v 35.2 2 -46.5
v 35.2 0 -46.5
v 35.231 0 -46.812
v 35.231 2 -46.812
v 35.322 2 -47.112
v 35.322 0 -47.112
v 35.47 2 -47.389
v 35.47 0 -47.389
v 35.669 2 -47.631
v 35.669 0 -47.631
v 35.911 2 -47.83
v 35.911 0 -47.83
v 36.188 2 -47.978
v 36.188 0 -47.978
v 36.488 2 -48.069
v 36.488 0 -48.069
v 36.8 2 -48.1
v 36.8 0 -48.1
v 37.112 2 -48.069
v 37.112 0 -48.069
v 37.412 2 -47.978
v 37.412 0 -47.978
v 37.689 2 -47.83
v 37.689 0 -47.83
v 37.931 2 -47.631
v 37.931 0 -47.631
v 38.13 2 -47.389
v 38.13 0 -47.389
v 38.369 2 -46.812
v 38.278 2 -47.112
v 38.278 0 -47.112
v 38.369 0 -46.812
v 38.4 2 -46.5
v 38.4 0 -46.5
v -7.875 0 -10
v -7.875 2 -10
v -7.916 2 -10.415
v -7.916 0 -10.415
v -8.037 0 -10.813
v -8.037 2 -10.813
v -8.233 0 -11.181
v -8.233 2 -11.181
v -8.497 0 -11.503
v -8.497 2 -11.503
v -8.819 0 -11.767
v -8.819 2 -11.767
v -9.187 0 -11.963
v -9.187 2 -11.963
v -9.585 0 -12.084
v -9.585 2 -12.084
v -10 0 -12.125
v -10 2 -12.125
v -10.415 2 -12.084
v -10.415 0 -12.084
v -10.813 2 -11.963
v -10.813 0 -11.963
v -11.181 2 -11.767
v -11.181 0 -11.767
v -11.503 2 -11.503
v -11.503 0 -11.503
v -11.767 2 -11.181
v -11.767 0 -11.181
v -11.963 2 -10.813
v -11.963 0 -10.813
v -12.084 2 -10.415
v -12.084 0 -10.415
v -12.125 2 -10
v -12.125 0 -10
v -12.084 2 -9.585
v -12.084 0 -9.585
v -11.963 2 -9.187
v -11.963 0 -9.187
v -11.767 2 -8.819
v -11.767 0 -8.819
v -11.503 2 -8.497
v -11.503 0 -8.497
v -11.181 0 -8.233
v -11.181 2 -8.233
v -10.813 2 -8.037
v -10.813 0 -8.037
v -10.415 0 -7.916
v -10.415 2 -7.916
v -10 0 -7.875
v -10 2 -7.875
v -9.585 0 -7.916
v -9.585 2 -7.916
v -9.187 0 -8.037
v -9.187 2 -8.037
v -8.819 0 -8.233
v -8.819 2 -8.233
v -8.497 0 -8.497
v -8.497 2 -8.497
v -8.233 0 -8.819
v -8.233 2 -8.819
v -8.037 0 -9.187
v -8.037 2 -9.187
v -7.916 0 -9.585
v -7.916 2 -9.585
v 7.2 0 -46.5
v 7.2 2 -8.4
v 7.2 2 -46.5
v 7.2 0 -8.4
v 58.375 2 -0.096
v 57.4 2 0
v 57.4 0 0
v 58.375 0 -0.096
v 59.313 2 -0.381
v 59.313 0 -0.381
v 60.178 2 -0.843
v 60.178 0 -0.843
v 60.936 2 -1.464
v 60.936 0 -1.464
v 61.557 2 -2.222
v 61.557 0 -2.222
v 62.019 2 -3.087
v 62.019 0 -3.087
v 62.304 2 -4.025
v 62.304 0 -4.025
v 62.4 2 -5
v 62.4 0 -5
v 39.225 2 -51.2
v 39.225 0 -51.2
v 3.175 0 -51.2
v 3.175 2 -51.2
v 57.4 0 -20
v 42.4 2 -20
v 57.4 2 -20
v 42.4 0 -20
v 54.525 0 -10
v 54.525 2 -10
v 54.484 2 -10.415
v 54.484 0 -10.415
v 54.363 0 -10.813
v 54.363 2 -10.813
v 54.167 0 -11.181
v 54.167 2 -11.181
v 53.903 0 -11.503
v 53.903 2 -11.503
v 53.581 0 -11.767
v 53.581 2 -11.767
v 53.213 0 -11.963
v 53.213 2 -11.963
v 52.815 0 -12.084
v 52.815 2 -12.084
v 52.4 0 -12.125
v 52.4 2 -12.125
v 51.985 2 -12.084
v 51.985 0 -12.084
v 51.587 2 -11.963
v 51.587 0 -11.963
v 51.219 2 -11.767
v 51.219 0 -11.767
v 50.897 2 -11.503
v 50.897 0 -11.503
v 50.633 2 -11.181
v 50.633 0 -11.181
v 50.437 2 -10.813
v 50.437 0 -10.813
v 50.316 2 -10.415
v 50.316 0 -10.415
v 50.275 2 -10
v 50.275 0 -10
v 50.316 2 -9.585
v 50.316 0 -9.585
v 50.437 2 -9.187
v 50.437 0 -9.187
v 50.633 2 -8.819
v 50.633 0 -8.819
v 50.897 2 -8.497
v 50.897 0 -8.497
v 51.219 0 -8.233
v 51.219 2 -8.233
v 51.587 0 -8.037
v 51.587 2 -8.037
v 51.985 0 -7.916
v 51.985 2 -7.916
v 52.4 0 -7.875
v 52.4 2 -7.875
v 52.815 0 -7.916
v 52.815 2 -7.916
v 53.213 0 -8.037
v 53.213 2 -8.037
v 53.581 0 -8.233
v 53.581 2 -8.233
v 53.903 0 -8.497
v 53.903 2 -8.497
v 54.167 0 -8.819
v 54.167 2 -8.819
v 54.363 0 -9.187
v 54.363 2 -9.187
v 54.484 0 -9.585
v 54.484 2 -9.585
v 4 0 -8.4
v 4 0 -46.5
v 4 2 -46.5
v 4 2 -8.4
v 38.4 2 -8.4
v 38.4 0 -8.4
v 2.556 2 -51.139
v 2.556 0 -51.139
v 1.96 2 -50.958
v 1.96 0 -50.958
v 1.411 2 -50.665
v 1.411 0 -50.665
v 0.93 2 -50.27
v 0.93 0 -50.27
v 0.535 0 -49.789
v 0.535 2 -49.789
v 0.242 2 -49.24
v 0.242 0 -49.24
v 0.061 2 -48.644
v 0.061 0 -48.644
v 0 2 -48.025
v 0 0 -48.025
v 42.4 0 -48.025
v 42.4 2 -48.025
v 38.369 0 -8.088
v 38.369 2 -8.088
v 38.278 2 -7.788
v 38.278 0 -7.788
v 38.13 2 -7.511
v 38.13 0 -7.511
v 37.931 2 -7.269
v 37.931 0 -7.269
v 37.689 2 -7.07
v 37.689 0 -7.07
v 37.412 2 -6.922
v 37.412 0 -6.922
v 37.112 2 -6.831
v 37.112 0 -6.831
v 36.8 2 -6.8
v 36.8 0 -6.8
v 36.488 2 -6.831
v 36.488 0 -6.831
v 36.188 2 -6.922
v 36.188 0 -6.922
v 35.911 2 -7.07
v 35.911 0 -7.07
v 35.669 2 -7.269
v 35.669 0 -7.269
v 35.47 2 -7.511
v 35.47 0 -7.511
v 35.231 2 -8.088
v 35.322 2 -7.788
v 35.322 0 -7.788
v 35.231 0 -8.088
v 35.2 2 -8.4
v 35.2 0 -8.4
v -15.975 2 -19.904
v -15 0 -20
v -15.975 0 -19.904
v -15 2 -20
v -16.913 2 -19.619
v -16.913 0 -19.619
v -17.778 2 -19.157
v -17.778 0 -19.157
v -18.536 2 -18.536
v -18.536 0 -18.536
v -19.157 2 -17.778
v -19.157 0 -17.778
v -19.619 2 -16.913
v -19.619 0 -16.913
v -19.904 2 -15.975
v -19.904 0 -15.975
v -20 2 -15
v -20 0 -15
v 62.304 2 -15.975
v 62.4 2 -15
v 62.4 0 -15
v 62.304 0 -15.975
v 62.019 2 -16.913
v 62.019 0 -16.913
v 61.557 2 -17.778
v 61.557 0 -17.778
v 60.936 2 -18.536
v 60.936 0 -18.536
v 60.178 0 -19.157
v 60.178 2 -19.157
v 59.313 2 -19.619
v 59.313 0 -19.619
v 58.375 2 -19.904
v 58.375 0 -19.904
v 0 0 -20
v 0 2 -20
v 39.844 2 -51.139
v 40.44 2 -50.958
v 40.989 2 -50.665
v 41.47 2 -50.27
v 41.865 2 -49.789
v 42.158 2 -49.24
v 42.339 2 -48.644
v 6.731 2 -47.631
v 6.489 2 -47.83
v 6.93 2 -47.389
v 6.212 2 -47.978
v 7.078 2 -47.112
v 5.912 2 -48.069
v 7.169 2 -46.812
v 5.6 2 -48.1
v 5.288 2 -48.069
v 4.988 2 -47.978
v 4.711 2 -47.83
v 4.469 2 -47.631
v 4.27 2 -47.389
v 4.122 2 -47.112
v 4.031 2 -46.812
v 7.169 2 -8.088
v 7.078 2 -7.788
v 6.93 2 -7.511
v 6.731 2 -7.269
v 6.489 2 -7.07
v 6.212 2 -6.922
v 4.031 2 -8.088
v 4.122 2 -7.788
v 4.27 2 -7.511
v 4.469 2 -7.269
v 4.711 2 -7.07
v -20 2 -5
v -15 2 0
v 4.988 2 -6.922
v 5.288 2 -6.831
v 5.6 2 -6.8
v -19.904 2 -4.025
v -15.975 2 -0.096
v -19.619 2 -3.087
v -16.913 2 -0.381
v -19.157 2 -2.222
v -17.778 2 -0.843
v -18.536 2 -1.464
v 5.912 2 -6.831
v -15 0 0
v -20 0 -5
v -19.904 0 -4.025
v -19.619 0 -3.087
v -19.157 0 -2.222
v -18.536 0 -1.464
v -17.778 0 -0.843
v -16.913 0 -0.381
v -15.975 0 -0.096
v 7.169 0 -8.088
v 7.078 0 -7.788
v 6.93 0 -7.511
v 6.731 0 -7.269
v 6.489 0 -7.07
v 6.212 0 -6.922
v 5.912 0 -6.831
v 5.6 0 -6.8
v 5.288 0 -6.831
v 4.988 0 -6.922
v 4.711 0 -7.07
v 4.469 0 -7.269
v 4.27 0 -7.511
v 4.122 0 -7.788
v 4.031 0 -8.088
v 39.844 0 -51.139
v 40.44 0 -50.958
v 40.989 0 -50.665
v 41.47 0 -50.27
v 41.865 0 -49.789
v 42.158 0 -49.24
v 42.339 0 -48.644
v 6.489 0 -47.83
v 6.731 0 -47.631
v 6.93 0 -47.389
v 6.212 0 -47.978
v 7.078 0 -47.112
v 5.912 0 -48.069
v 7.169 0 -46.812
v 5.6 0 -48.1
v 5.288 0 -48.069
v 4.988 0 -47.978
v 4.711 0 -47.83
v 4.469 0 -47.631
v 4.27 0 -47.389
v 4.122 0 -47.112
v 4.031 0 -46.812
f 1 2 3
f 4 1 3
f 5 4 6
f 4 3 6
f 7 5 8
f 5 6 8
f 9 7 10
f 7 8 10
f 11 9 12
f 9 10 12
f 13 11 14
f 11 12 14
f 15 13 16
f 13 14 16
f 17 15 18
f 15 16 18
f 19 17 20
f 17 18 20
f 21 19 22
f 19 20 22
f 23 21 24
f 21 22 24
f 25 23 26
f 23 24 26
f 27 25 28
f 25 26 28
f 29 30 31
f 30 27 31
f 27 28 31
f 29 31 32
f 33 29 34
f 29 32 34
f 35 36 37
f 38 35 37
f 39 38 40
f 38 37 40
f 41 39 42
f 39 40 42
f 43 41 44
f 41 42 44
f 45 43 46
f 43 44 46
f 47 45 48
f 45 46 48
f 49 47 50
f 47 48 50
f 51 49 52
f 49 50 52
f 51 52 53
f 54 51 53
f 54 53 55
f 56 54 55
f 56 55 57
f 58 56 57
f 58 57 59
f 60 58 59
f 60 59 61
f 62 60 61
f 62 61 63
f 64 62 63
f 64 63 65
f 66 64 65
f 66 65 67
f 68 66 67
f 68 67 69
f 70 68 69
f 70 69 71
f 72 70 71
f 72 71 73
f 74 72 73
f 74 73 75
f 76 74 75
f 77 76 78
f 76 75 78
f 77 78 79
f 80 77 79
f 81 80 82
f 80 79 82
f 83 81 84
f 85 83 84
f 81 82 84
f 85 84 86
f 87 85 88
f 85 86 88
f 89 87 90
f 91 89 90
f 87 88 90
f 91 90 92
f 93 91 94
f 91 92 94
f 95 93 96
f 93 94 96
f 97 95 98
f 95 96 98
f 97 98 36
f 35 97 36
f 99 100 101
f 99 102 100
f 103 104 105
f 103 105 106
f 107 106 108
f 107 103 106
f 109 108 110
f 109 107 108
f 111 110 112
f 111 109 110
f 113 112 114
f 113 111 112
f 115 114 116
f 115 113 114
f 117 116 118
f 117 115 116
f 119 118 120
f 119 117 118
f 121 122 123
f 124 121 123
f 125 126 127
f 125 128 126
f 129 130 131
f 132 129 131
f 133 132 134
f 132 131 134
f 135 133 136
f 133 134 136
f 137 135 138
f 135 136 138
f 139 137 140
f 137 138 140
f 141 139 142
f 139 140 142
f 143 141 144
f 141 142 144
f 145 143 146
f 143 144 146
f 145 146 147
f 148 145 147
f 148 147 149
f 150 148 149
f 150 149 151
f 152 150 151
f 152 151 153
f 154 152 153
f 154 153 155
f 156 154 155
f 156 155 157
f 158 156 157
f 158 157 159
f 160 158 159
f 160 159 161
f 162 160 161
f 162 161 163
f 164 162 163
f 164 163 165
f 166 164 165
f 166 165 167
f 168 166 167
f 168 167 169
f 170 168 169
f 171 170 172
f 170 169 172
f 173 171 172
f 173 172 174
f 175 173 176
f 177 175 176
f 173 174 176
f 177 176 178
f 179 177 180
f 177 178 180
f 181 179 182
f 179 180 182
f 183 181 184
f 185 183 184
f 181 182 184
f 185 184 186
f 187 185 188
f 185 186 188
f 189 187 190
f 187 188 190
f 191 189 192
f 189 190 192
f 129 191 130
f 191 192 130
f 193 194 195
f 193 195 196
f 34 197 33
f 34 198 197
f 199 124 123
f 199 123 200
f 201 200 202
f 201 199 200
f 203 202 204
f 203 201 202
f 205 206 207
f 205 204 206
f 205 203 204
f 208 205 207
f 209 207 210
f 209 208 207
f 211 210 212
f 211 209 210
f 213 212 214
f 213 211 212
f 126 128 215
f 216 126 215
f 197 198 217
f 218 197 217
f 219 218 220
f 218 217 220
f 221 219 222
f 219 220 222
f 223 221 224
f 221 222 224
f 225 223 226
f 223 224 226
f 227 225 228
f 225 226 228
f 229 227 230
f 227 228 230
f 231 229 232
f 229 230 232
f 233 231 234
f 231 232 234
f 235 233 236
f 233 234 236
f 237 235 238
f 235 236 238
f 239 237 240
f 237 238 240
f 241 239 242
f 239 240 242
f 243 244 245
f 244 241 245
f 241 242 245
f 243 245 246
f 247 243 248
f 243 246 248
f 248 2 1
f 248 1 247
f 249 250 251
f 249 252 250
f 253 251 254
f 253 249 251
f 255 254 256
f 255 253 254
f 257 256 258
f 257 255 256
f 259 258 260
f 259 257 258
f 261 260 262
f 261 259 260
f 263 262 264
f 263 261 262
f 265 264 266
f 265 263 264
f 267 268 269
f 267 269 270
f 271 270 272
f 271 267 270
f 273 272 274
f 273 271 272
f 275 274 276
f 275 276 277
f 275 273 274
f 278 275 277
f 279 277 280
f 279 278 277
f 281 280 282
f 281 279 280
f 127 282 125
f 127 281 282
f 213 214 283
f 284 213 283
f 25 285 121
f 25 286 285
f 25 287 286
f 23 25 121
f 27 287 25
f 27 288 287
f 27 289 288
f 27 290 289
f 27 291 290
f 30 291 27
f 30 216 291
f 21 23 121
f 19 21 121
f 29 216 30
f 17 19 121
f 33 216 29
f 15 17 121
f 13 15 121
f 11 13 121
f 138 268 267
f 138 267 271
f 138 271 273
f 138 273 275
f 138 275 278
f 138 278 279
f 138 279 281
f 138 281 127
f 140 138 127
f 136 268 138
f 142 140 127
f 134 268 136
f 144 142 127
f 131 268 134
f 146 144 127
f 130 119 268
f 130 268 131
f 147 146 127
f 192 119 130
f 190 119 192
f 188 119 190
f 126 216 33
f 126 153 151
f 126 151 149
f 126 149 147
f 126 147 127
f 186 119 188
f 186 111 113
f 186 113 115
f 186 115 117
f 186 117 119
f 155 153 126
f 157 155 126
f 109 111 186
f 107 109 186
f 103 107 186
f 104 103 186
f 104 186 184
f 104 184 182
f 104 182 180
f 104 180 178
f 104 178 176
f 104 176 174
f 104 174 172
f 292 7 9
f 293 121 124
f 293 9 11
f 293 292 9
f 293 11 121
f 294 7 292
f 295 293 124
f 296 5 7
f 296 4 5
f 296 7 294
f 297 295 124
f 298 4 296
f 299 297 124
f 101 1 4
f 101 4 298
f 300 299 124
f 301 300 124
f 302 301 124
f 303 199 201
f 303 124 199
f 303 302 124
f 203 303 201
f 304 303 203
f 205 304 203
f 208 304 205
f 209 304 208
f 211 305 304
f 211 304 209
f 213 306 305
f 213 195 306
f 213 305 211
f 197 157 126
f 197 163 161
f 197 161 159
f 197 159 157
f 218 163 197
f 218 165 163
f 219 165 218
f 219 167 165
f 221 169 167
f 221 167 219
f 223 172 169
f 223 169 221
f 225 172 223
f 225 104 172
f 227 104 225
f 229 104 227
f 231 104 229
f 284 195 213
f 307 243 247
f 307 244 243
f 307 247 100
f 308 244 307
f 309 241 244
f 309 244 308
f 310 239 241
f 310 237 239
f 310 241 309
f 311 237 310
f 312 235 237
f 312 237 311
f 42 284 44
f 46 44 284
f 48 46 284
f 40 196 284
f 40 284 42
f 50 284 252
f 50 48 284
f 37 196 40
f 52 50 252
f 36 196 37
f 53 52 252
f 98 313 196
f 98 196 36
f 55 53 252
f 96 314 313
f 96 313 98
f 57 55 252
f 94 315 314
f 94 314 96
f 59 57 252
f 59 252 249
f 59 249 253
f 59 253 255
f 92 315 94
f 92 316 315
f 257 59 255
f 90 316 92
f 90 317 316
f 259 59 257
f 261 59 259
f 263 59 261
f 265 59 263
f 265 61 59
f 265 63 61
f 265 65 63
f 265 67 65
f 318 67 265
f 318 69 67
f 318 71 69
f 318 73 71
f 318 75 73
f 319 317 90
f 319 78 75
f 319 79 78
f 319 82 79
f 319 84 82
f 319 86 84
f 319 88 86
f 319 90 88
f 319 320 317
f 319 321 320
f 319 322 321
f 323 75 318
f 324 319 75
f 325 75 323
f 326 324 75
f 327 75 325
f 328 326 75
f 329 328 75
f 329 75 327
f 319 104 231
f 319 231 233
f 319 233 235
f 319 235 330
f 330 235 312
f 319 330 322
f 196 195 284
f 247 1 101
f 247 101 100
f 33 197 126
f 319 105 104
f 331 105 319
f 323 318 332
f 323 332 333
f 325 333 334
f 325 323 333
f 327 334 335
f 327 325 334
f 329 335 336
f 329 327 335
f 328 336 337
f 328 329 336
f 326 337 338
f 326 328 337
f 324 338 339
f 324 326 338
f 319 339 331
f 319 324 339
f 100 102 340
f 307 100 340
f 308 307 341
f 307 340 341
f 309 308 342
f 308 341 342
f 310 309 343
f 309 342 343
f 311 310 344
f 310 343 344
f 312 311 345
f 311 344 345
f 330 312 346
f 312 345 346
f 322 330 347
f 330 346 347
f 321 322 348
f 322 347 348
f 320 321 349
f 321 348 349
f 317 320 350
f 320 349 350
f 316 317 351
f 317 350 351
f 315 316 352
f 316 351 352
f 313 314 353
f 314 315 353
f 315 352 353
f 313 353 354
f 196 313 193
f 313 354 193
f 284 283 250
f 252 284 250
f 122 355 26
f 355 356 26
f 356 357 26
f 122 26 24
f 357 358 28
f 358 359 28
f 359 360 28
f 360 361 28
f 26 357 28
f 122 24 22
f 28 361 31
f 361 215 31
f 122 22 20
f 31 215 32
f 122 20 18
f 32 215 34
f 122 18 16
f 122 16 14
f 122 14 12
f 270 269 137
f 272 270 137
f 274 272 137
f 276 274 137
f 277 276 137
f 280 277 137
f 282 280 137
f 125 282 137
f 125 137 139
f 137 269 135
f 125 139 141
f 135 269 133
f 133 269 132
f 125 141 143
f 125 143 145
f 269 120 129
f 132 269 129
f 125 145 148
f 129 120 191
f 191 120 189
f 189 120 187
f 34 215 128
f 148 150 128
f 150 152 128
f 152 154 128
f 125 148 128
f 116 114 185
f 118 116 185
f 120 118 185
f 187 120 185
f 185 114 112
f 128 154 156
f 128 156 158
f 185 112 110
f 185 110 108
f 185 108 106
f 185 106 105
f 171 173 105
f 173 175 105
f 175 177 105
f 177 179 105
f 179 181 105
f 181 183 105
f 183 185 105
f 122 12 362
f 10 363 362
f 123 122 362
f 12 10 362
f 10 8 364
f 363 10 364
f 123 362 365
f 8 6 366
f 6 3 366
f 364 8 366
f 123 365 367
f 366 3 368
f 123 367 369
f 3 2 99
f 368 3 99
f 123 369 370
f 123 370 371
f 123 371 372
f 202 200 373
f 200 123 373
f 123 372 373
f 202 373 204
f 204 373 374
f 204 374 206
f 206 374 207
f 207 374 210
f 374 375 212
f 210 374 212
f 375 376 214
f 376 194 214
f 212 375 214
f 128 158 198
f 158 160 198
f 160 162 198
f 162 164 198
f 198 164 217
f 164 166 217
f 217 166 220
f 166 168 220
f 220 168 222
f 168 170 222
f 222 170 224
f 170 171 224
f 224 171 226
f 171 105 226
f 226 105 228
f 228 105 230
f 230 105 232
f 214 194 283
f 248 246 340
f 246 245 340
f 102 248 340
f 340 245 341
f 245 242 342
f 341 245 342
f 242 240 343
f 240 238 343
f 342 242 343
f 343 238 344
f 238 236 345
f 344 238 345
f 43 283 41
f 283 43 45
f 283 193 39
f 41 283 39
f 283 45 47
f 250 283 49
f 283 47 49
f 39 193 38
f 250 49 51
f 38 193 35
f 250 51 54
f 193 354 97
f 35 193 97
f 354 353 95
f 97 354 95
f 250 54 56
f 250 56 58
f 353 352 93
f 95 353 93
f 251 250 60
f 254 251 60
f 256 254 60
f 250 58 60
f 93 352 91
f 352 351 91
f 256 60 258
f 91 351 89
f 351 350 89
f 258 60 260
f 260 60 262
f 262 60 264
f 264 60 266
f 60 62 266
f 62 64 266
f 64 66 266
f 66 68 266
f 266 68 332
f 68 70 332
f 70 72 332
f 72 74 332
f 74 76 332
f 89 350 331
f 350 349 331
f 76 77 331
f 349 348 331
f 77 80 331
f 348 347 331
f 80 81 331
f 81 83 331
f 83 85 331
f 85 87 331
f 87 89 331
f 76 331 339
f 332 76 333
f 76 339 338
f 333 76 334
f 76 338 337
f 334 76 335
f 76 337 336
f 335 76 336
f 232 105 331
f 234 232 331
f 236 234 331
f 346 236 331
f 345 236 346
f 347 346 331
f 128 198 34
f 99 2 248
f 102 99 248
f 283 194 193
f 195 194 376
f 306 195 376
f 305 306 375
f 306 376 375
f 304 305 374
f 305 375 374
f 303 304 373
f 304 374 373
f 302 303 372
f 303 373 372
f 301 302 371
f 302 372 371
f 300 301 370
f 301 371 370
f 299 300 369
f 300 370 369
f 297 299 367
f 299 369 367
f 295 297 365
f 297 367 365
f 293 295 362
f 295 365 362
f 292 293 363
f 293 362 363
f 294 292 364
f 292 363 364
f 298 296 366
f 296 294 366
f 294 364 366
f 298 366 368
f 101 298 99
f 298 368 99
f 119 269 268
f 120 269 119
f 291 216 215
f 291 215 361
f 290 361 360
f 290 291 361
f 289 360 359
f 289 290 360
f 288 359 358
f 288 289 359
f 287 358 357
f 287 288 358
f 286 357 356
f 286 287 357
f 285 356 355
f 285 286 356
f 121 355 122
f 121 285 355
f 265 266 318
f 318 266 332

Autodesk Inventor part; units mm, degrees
ref_plane "YZ Plane" through (0, 0, 0) normal (1, 0, 0) x (0, 1, 0)
ref_plane "XZ Plane" through (0, 0, 0) normal (0, 1, 0) x (-1, 0, 0)
ref_plane "XY Plane" through (0, 0, 0) normal (0, 0, 1) x (1, 0, 0)
sketch "Sketch1" plane through (0, 0, 0) normal (0, 1, 0) x (-1, 0, 0)
  line L0 (0, 0) -> (-42.4, 0)
  line L1 (-42.4, -20) -> (-42.4, -51.2)
  line L2 (-42.4, -51.2) -> (0, -51.2)
  line L3 (0, -51.2) -> (0, -20)
  line L4 (-21.2, 0) -> (-6.45, 0)
  line L5 (-6.45, 0) -> (-28.15, 0)
  line L6 (-21.2, 0) -> (0.55, 0)
  line L7 (0.55, 0) -> (-30.65, 0)
  line L8 (-21.2, 0) -> (-5.6, 0)
  line L9 (-5.6, 0) -> (-36.8, 0)
  arc A0 (-35.2, -8.4) -> (-38.4, -8.4) centre (-36.8, -8.4) ccw
  arc A1 (-38.4, -46.5) -> (-35.2, -46.5) centre (-36.8, -46.5) ccw
  arc A2 (-4, -8.4) -> (-7.2, -8.4) centre (-5.6, -8.4) ccw
  arc A3 (-7.2, -46.5) -> (-4, -46.5) centre (-5.6, -46.5) ccw
  line L10 (0, 0) -> (0, -20)
  line L11 (0, -20) -> (20, -20)
  line L12 (20, -20) -> (20, 0)
  line L13 (20, 0) -> (0, 0)
  line L14 (-42.4, -20) -> (-62.4, -20)
  line L15 (-62.4, -20) -> (-62.4, 0)
  line L16 (-62.4, 0) -> (-42.4, 0)
  line L17 (-4, -46.5) -> (-4, -8.4)
  line L18 (-7.2, -8.4) -> (-7.2, -46.5)
  line L19 (-35.2, -46.5) -> (-35.2, -8.4)
  line L20 (-38.4, -8.4) -> (-38.4, -46.5)
  dimension "d0" = 42.4
  dimension "d1" = 51.2
  dimension "d41" = 15.6
  dimension "d42" = 31.2
  dimension "d50" = 3.2
  dimension "d56" = 3.2
  dimension "d57" = 3.2
  dimension "d63" = 3.2
  dimension "d67" = 8.4
  dimension "d77" = 8.4
  dimension "d81" = 20
  dimension "d82" = 20
  dimension "d83" = 20
extrude "Extrusion3" add sketch "Sketch1" along normal blind 2
fillet "Fillet2" radius 3.175 2 edges at (0, 1, -51.2) (42.4, 1, -51.2)
sketch "Sketch2" plane through (0, 2, 0) normal (0, 1, 0) x (1, 0, 0)
  circle A0 centre (-10, 10) radius 2.125
  line L0 (-20, 0) -> (62.4, 0) projected
  line L1 (38.17, 0) -> (48.17, 0)
  line L2 (62.4, 0) -> (52.4, 0)
  line L3 (-20, 0) -> (62.4, 0) projected
  line L4 (52.4, 0) -> (52.4, 10)
  circle A1 centre (52.4, 10) radius 2.125
  point P0 (0, 0)
  dimension "d85" = 4.25
  dimension "d92" = 10
  dimension "d93" = 10
  dimension "d94" = 4.25
extrude "Extrusion4" cut sketch "Sketch2" against normal blind 2
fillet "Fillet3" radius 5 4 edges at (62.4, 1, -20) (62.4, 1, 0) (-20, 1, 0) (-20, 1, -20)
properties part number "Motor Attachment Small 3.0"
